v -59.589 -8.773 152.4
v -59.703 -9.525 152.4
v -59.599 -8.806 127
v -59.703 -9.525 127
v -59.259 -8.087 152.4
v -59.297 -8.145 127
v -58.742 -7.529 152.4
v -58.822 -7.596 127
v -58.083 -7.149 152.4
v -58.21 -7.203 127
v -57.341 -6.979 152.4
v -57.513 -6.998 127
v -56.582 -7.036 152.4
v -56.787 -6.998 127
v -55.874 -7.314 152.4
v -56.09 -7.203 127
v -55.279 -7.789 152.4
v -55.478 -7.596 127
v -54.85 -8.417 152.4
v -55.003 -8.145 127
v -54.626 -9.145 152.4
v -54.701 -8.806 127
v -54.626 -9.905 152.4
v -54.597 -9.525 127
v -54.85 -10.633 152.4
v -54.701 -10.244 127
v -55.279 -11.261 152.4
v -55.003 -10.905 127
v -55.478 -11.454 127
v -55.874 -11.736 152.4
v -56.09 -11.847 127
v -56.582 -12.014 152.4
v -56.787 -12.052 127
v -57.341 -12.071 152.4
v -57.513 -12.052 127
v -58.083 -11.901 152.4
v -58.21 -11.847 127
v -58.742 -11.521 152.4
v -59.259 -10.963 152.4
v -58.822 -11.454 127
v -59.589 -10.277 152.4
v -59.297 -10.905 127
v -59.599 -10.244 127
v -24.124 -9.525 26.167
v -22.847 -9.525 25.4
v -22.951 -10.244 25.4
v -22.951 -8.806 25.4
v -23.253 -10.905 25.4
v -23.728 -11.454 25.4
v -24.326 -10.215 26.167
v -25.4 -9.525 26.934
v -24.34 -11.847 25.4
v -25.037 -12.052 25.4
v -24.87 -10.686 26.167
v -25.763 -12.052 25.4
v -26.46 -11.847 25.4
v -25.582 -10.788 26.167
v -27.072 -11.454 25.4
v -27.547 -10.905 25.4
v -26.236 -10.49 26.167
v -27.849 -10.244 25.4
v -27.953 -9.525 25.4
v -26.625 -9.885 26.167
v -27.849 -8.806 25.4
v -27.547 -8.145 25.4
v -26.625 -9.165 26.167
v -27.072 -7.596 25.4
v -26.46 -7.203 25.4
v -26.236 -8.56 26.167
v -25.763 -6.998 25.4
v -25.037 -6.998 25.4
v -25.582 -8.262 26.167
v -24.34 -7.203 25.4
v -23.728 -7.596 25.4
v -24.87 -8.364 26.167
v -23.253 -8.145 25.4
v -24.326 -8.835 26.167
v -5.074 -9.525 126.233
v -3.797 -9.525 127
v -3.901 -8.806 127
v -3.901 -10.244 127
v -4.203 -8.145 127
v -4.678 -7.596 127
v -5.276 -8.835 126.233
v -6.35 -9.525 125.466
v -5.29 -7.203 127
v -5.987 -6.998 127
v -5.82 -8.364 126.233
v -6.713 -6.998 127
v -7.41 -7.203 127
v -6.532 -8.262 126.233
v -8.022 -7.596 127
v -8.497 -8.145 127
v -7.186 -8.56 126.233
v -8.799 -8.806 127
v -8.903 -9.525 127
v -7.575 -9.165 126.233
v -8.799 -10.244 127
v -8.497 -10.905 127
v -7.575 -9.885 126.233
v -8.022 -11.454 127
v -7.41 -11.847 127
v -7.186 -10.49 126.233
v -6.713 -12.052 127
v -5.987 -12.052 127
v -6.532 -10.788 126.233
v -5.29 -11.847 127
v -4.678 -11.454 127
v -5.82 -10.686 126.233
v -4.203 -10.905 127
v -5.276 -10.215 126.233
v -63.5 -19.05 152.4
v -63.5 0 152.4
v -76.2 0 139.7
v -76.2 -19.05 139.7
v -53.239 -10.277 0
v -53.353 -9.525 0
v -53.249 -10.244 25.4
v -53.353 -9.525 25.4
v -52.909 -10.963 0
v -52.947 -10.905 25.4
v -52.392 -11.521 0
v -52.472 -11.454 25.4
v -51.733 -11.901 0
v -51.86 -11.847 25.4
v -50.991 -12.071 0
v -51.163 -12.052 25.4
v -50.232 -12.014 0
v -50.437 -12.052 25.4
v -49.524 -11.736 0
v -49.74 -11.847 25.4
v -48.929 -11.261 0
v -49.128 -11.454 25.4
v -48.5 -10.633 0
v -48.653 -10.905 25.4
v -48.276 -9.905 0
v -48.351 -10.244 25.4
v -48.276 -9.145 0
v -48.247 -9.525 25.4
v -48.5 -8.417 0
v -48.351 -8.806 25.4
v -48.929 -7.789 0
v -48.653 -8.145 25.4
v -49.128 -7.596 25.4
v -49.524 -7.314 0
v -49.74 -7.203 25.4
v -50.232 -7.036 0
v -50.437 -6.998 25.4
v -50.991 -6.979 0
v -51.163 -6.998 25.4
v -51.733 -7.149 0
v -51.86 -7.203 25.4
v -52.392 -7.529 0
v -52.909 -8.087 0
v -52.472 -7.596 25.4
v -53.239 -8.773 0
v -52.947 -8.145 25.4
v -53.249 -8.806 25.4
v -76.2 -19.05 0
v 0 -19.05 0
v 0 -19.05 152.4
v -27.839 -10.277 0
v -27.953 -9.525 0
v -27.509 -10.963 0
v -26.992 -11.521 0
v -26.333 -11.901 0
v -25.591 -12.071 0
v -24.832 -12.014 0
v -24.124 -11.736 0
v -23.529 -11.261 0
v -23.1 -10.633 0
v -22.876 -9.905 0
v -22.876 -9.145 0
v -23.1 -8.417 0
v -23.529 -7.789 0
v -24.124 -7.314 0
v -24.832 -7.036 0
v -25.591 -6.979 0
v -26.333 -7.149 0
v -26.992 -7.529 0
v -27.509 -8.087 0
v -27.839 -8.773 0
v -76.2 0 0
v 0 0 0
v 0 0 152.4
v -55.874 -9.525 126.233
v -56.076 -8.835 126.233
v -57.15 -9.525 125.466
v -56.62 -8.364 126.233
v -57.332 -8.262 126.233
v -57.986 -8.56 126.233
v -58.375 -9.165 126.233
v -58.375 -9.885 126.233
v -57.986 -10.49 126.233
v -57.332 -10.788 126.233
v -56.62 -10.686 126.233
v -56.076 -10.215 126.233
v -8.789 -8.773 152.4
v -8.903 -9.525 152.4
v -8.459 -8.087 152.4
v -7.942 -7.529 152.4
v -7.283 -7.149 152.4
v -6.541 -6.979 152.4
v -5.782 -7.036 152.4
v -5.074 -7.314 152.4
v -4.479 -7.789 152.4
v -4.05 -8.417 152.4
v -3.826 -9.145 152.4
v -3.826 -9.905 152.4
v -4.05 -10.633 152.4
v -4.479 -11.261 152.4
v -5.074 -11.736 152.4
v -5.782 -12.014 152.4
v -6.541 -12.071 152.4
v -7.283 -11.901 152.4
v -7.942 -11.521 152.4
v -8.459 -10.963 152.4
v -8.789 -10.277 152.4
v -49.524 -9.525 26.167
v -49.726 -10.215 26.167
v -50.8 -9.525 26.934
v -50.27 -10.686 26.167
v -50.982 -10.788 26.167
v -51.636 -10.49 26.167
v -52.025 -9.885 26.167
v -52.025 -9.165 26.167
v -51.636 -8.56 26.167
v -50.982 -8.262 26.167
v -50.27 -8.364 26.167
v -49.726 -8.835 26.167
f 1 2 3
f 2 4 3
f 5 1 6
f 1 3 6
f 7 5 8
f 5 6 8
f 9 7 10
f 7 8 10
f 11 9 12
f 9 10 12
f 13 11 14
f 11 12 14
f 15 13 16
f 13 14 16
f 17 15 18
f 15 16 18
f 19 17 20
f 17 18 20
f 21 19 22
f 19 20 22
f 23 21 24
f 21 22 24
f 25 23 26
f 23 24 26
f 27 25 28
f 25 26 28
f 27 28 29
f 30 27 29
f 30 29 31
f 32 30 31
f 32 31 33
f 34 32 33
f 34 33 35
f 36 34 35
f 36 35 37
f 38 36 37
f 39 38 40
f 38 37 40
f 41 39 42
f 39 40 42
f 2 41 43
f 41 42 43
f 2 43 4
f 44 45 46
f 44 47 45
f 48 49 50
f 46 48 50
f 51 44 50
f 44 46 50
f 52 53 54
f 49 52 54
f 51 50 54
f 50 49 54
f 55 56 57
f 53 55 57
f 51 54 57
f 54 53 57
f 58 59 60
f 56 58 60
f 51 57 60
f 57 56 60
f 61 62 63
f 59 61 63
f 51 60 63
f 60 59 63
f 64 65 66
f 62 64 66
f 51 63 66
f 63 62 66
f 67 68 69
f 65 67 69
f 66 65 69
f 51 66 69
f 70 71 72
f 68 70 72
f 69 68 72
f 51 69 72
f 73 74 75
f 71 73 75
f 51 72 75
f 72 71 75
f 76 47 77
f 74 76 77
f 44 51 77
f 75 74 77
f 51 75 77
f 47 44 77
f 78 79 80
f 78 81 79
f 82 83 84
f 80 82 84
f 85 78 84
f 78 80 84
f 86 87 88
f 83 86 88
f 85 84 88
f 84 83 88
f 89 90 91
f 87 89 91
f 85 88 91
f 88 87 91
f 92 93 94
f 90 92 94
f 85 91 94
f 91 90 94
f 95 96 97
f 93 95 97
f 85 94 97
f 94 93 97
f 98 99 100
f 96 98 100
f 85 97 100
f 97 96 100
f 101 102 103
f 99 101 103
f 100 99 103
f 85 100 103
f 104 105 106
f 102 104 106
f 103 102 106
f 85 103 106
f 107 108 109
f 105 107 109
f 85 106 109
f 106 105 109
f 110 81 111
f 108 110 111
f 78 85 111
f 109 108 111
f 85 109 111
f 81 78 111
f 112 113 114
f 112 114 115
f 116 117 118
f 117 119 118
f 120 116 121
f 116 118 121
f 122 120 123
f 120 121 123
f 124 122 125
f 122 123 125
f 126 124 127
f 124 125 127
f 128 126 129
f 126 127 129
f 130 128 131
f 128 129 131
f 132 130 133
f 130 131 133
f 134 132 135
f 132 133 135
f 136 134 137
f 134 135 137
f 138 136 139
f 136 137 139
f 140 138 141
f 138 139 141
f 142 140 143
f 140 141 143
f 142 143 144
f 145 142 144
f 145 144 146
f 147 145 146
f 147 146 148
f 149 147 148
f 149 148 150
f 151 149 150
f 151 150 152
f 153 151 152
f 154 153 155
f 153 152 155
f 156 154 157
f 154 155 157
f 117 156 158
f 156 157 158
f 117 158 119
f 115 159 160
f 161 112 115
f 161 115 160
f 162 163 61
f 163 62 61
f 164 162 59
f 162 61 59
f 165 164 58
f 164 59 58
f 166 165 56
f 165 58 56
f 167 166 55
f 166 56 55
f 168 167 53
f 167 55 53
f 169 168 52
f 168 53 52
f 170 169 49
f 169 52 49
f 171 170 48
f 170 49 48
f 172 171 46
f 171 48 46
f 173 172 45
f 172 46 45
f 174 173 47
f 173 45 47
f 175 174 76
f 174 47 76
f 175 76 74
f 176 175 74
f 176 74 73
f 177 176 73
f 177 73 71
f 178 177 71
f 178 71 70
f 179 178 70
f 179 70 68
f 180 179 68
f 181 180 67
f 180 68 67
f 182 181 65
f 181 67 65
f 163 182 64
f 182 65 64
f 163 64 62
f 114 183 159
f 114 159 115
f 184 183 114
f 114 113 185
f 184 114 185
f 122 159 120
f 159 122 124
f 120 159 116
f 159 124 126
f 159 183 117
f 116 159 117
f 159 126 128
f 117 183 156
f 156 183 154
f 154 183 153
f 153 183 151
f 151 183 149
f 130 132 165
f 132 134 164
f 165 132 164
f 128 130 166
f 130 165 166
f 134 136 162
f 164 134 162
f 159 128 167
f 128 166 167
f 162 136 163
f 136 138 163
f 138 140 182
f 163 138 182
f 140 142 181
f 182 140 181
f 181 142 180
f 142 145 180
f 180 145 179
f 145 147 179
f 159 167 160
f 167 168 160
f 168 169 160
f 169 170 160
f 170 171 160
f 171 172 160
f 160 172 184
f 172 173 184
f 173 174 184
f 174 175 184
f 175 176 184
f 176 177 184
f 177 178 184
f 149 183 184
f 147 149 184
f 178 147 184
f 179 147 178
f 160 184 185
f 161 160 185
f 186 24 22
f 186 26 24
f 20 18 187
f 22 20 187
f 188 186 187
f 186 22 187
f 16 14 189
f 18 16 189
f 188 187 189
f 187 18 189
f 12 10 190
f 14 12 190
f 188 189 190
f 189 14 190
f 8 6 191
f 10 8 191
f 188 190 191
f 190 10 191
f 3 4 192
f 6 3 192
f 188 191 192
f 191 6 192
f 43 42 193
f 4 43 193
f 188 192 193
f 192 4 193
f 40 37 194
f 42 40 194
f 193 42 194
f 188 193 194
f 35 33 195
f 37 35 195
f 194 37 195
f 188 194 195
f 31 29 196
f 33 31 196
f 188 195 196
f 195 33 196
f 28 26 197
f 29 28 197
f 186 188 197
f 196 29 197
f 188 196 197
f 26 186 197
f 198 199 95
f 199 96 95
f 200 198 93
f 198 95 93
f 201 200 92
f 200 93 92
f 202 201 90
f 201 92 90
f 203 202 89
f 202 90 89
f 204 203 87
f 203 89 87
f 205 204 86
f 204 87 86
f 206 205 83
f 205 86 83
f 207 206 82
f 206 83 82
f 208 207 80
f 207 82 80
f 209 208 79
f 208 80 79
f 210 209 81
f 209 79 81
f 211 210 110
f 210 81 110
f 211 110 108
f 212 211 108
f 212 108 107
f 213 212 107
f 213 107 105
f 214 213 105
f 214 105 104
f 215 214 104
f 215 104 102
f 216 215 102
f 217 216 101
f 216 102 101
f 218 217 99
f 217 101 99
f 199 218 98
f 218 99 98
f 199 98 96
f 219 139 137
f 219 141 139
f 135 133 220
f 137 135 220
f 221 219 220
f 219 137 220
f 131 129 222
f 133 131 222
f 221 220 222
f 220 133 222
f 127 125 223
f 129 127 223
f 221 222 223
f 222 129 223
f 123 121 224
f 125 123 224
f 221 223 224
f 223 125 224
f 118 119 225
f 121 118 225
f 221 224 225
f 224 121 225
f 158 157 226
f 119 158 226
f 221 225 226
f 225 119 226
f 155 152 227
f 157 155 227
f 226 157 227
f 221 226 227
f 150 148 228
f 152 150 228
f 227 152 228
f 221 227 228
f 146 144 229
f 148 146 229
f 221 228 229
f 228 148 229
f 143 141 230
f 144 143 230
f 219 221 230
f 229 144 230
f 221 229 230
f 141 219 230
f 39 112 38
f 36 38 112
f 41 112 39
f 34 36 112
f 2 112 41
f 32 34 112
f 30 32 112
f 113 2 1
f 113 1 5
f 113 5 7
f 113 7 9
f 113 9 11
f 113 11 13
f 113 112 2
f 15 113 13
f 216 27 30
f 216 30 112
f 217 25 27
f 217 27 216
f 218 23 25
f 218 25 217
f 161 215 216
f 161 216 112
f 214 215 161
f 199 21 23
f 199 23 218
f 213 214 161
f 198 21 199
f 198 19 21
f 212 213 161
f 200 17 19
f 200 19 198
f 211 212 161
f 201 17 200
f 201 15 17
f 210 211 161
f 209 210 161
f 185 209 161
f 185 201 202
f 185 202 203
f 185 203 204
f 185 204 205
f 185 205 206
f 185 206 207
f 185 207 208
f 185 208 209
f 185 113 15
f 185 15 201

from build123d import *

# Parameters (mm, degrees)
F0_W     = 76.2
F0_H     = 152.4
F1_DEPTH = 19.05
F3_D     = 5.1054
F3_DEPTH = 25.4
F3_TIP   = 1.5338169022
F4_D     = 5.1054
F4_DEPTH = 25.4
F4_TIP   = 1.5338169022
F6_D     = 5.1054
F6_DEPTH = 25.4
F6_TIP   = 1.5338169022
F7_SIZE  = 12.7


with BuildPart() as f1:
    # F0 (on Front) → F1 (new body)
    with BuildSketch(Plane.XZ):
        with Locations((-38.1, 76.2)):
            Rectangle(F0_W, F0_H)
    extrude(amount=F1_DEPTH)

    # F3
    with Locations(Plane(origin=(0, 0, 0), x_dir=(1, 0, 0), z_dir=(0, 0, -1))):
        with Locations((-50.8, 9.525)):
            Hole(F3_D / 2, depth=F3_DEPTH)
            with Locations((0, 0, -(F3_DEPTH + F3_TIP / 2))):  # 118° drill point
                Cone(0, F3_D / 2, F3_TIP, mode=Mode.SUBTRACT)

    # F4
    with Locations(Plane(origin=(0, 0, 0), x_dir=(1, 0, 0), z_dir=(0, 0, -1))):
        with Locations((-25.4, 9.525)):
            Hole(F4_D / 2, depth=F4_DEPTH)
            with Locations((0, 0, -(F4_DEPTH + F4_TIP / 2))):  # 118° drill point
                Cone(0, F4_D / 2, F4_TIP, mode=Mode.SUBTRACT)

    # F6
    with Locations(Plane.XY.offset(152.4)):
        with Locations((-57.15, -9.525), (-6.35, -9.525)):
            Hole(F6_D / 2, depth=F6_DEPTH)
            with Locations((0, 0, -(F6_DEPTH + F6_TIP / 2))):  # 118° drill point
                Cone(0, F6_D / 2, F6_TIP, mode=Mode.SUBTRACT)

    # F7
    f7_edges = [f1.edges().sort_by_distance(p)[0] for p in [
        (-76.2, -9.525, 152.4),
    ]]
    chamfer(f7_edges, length=F7_SIZE)


solid = f1.part
